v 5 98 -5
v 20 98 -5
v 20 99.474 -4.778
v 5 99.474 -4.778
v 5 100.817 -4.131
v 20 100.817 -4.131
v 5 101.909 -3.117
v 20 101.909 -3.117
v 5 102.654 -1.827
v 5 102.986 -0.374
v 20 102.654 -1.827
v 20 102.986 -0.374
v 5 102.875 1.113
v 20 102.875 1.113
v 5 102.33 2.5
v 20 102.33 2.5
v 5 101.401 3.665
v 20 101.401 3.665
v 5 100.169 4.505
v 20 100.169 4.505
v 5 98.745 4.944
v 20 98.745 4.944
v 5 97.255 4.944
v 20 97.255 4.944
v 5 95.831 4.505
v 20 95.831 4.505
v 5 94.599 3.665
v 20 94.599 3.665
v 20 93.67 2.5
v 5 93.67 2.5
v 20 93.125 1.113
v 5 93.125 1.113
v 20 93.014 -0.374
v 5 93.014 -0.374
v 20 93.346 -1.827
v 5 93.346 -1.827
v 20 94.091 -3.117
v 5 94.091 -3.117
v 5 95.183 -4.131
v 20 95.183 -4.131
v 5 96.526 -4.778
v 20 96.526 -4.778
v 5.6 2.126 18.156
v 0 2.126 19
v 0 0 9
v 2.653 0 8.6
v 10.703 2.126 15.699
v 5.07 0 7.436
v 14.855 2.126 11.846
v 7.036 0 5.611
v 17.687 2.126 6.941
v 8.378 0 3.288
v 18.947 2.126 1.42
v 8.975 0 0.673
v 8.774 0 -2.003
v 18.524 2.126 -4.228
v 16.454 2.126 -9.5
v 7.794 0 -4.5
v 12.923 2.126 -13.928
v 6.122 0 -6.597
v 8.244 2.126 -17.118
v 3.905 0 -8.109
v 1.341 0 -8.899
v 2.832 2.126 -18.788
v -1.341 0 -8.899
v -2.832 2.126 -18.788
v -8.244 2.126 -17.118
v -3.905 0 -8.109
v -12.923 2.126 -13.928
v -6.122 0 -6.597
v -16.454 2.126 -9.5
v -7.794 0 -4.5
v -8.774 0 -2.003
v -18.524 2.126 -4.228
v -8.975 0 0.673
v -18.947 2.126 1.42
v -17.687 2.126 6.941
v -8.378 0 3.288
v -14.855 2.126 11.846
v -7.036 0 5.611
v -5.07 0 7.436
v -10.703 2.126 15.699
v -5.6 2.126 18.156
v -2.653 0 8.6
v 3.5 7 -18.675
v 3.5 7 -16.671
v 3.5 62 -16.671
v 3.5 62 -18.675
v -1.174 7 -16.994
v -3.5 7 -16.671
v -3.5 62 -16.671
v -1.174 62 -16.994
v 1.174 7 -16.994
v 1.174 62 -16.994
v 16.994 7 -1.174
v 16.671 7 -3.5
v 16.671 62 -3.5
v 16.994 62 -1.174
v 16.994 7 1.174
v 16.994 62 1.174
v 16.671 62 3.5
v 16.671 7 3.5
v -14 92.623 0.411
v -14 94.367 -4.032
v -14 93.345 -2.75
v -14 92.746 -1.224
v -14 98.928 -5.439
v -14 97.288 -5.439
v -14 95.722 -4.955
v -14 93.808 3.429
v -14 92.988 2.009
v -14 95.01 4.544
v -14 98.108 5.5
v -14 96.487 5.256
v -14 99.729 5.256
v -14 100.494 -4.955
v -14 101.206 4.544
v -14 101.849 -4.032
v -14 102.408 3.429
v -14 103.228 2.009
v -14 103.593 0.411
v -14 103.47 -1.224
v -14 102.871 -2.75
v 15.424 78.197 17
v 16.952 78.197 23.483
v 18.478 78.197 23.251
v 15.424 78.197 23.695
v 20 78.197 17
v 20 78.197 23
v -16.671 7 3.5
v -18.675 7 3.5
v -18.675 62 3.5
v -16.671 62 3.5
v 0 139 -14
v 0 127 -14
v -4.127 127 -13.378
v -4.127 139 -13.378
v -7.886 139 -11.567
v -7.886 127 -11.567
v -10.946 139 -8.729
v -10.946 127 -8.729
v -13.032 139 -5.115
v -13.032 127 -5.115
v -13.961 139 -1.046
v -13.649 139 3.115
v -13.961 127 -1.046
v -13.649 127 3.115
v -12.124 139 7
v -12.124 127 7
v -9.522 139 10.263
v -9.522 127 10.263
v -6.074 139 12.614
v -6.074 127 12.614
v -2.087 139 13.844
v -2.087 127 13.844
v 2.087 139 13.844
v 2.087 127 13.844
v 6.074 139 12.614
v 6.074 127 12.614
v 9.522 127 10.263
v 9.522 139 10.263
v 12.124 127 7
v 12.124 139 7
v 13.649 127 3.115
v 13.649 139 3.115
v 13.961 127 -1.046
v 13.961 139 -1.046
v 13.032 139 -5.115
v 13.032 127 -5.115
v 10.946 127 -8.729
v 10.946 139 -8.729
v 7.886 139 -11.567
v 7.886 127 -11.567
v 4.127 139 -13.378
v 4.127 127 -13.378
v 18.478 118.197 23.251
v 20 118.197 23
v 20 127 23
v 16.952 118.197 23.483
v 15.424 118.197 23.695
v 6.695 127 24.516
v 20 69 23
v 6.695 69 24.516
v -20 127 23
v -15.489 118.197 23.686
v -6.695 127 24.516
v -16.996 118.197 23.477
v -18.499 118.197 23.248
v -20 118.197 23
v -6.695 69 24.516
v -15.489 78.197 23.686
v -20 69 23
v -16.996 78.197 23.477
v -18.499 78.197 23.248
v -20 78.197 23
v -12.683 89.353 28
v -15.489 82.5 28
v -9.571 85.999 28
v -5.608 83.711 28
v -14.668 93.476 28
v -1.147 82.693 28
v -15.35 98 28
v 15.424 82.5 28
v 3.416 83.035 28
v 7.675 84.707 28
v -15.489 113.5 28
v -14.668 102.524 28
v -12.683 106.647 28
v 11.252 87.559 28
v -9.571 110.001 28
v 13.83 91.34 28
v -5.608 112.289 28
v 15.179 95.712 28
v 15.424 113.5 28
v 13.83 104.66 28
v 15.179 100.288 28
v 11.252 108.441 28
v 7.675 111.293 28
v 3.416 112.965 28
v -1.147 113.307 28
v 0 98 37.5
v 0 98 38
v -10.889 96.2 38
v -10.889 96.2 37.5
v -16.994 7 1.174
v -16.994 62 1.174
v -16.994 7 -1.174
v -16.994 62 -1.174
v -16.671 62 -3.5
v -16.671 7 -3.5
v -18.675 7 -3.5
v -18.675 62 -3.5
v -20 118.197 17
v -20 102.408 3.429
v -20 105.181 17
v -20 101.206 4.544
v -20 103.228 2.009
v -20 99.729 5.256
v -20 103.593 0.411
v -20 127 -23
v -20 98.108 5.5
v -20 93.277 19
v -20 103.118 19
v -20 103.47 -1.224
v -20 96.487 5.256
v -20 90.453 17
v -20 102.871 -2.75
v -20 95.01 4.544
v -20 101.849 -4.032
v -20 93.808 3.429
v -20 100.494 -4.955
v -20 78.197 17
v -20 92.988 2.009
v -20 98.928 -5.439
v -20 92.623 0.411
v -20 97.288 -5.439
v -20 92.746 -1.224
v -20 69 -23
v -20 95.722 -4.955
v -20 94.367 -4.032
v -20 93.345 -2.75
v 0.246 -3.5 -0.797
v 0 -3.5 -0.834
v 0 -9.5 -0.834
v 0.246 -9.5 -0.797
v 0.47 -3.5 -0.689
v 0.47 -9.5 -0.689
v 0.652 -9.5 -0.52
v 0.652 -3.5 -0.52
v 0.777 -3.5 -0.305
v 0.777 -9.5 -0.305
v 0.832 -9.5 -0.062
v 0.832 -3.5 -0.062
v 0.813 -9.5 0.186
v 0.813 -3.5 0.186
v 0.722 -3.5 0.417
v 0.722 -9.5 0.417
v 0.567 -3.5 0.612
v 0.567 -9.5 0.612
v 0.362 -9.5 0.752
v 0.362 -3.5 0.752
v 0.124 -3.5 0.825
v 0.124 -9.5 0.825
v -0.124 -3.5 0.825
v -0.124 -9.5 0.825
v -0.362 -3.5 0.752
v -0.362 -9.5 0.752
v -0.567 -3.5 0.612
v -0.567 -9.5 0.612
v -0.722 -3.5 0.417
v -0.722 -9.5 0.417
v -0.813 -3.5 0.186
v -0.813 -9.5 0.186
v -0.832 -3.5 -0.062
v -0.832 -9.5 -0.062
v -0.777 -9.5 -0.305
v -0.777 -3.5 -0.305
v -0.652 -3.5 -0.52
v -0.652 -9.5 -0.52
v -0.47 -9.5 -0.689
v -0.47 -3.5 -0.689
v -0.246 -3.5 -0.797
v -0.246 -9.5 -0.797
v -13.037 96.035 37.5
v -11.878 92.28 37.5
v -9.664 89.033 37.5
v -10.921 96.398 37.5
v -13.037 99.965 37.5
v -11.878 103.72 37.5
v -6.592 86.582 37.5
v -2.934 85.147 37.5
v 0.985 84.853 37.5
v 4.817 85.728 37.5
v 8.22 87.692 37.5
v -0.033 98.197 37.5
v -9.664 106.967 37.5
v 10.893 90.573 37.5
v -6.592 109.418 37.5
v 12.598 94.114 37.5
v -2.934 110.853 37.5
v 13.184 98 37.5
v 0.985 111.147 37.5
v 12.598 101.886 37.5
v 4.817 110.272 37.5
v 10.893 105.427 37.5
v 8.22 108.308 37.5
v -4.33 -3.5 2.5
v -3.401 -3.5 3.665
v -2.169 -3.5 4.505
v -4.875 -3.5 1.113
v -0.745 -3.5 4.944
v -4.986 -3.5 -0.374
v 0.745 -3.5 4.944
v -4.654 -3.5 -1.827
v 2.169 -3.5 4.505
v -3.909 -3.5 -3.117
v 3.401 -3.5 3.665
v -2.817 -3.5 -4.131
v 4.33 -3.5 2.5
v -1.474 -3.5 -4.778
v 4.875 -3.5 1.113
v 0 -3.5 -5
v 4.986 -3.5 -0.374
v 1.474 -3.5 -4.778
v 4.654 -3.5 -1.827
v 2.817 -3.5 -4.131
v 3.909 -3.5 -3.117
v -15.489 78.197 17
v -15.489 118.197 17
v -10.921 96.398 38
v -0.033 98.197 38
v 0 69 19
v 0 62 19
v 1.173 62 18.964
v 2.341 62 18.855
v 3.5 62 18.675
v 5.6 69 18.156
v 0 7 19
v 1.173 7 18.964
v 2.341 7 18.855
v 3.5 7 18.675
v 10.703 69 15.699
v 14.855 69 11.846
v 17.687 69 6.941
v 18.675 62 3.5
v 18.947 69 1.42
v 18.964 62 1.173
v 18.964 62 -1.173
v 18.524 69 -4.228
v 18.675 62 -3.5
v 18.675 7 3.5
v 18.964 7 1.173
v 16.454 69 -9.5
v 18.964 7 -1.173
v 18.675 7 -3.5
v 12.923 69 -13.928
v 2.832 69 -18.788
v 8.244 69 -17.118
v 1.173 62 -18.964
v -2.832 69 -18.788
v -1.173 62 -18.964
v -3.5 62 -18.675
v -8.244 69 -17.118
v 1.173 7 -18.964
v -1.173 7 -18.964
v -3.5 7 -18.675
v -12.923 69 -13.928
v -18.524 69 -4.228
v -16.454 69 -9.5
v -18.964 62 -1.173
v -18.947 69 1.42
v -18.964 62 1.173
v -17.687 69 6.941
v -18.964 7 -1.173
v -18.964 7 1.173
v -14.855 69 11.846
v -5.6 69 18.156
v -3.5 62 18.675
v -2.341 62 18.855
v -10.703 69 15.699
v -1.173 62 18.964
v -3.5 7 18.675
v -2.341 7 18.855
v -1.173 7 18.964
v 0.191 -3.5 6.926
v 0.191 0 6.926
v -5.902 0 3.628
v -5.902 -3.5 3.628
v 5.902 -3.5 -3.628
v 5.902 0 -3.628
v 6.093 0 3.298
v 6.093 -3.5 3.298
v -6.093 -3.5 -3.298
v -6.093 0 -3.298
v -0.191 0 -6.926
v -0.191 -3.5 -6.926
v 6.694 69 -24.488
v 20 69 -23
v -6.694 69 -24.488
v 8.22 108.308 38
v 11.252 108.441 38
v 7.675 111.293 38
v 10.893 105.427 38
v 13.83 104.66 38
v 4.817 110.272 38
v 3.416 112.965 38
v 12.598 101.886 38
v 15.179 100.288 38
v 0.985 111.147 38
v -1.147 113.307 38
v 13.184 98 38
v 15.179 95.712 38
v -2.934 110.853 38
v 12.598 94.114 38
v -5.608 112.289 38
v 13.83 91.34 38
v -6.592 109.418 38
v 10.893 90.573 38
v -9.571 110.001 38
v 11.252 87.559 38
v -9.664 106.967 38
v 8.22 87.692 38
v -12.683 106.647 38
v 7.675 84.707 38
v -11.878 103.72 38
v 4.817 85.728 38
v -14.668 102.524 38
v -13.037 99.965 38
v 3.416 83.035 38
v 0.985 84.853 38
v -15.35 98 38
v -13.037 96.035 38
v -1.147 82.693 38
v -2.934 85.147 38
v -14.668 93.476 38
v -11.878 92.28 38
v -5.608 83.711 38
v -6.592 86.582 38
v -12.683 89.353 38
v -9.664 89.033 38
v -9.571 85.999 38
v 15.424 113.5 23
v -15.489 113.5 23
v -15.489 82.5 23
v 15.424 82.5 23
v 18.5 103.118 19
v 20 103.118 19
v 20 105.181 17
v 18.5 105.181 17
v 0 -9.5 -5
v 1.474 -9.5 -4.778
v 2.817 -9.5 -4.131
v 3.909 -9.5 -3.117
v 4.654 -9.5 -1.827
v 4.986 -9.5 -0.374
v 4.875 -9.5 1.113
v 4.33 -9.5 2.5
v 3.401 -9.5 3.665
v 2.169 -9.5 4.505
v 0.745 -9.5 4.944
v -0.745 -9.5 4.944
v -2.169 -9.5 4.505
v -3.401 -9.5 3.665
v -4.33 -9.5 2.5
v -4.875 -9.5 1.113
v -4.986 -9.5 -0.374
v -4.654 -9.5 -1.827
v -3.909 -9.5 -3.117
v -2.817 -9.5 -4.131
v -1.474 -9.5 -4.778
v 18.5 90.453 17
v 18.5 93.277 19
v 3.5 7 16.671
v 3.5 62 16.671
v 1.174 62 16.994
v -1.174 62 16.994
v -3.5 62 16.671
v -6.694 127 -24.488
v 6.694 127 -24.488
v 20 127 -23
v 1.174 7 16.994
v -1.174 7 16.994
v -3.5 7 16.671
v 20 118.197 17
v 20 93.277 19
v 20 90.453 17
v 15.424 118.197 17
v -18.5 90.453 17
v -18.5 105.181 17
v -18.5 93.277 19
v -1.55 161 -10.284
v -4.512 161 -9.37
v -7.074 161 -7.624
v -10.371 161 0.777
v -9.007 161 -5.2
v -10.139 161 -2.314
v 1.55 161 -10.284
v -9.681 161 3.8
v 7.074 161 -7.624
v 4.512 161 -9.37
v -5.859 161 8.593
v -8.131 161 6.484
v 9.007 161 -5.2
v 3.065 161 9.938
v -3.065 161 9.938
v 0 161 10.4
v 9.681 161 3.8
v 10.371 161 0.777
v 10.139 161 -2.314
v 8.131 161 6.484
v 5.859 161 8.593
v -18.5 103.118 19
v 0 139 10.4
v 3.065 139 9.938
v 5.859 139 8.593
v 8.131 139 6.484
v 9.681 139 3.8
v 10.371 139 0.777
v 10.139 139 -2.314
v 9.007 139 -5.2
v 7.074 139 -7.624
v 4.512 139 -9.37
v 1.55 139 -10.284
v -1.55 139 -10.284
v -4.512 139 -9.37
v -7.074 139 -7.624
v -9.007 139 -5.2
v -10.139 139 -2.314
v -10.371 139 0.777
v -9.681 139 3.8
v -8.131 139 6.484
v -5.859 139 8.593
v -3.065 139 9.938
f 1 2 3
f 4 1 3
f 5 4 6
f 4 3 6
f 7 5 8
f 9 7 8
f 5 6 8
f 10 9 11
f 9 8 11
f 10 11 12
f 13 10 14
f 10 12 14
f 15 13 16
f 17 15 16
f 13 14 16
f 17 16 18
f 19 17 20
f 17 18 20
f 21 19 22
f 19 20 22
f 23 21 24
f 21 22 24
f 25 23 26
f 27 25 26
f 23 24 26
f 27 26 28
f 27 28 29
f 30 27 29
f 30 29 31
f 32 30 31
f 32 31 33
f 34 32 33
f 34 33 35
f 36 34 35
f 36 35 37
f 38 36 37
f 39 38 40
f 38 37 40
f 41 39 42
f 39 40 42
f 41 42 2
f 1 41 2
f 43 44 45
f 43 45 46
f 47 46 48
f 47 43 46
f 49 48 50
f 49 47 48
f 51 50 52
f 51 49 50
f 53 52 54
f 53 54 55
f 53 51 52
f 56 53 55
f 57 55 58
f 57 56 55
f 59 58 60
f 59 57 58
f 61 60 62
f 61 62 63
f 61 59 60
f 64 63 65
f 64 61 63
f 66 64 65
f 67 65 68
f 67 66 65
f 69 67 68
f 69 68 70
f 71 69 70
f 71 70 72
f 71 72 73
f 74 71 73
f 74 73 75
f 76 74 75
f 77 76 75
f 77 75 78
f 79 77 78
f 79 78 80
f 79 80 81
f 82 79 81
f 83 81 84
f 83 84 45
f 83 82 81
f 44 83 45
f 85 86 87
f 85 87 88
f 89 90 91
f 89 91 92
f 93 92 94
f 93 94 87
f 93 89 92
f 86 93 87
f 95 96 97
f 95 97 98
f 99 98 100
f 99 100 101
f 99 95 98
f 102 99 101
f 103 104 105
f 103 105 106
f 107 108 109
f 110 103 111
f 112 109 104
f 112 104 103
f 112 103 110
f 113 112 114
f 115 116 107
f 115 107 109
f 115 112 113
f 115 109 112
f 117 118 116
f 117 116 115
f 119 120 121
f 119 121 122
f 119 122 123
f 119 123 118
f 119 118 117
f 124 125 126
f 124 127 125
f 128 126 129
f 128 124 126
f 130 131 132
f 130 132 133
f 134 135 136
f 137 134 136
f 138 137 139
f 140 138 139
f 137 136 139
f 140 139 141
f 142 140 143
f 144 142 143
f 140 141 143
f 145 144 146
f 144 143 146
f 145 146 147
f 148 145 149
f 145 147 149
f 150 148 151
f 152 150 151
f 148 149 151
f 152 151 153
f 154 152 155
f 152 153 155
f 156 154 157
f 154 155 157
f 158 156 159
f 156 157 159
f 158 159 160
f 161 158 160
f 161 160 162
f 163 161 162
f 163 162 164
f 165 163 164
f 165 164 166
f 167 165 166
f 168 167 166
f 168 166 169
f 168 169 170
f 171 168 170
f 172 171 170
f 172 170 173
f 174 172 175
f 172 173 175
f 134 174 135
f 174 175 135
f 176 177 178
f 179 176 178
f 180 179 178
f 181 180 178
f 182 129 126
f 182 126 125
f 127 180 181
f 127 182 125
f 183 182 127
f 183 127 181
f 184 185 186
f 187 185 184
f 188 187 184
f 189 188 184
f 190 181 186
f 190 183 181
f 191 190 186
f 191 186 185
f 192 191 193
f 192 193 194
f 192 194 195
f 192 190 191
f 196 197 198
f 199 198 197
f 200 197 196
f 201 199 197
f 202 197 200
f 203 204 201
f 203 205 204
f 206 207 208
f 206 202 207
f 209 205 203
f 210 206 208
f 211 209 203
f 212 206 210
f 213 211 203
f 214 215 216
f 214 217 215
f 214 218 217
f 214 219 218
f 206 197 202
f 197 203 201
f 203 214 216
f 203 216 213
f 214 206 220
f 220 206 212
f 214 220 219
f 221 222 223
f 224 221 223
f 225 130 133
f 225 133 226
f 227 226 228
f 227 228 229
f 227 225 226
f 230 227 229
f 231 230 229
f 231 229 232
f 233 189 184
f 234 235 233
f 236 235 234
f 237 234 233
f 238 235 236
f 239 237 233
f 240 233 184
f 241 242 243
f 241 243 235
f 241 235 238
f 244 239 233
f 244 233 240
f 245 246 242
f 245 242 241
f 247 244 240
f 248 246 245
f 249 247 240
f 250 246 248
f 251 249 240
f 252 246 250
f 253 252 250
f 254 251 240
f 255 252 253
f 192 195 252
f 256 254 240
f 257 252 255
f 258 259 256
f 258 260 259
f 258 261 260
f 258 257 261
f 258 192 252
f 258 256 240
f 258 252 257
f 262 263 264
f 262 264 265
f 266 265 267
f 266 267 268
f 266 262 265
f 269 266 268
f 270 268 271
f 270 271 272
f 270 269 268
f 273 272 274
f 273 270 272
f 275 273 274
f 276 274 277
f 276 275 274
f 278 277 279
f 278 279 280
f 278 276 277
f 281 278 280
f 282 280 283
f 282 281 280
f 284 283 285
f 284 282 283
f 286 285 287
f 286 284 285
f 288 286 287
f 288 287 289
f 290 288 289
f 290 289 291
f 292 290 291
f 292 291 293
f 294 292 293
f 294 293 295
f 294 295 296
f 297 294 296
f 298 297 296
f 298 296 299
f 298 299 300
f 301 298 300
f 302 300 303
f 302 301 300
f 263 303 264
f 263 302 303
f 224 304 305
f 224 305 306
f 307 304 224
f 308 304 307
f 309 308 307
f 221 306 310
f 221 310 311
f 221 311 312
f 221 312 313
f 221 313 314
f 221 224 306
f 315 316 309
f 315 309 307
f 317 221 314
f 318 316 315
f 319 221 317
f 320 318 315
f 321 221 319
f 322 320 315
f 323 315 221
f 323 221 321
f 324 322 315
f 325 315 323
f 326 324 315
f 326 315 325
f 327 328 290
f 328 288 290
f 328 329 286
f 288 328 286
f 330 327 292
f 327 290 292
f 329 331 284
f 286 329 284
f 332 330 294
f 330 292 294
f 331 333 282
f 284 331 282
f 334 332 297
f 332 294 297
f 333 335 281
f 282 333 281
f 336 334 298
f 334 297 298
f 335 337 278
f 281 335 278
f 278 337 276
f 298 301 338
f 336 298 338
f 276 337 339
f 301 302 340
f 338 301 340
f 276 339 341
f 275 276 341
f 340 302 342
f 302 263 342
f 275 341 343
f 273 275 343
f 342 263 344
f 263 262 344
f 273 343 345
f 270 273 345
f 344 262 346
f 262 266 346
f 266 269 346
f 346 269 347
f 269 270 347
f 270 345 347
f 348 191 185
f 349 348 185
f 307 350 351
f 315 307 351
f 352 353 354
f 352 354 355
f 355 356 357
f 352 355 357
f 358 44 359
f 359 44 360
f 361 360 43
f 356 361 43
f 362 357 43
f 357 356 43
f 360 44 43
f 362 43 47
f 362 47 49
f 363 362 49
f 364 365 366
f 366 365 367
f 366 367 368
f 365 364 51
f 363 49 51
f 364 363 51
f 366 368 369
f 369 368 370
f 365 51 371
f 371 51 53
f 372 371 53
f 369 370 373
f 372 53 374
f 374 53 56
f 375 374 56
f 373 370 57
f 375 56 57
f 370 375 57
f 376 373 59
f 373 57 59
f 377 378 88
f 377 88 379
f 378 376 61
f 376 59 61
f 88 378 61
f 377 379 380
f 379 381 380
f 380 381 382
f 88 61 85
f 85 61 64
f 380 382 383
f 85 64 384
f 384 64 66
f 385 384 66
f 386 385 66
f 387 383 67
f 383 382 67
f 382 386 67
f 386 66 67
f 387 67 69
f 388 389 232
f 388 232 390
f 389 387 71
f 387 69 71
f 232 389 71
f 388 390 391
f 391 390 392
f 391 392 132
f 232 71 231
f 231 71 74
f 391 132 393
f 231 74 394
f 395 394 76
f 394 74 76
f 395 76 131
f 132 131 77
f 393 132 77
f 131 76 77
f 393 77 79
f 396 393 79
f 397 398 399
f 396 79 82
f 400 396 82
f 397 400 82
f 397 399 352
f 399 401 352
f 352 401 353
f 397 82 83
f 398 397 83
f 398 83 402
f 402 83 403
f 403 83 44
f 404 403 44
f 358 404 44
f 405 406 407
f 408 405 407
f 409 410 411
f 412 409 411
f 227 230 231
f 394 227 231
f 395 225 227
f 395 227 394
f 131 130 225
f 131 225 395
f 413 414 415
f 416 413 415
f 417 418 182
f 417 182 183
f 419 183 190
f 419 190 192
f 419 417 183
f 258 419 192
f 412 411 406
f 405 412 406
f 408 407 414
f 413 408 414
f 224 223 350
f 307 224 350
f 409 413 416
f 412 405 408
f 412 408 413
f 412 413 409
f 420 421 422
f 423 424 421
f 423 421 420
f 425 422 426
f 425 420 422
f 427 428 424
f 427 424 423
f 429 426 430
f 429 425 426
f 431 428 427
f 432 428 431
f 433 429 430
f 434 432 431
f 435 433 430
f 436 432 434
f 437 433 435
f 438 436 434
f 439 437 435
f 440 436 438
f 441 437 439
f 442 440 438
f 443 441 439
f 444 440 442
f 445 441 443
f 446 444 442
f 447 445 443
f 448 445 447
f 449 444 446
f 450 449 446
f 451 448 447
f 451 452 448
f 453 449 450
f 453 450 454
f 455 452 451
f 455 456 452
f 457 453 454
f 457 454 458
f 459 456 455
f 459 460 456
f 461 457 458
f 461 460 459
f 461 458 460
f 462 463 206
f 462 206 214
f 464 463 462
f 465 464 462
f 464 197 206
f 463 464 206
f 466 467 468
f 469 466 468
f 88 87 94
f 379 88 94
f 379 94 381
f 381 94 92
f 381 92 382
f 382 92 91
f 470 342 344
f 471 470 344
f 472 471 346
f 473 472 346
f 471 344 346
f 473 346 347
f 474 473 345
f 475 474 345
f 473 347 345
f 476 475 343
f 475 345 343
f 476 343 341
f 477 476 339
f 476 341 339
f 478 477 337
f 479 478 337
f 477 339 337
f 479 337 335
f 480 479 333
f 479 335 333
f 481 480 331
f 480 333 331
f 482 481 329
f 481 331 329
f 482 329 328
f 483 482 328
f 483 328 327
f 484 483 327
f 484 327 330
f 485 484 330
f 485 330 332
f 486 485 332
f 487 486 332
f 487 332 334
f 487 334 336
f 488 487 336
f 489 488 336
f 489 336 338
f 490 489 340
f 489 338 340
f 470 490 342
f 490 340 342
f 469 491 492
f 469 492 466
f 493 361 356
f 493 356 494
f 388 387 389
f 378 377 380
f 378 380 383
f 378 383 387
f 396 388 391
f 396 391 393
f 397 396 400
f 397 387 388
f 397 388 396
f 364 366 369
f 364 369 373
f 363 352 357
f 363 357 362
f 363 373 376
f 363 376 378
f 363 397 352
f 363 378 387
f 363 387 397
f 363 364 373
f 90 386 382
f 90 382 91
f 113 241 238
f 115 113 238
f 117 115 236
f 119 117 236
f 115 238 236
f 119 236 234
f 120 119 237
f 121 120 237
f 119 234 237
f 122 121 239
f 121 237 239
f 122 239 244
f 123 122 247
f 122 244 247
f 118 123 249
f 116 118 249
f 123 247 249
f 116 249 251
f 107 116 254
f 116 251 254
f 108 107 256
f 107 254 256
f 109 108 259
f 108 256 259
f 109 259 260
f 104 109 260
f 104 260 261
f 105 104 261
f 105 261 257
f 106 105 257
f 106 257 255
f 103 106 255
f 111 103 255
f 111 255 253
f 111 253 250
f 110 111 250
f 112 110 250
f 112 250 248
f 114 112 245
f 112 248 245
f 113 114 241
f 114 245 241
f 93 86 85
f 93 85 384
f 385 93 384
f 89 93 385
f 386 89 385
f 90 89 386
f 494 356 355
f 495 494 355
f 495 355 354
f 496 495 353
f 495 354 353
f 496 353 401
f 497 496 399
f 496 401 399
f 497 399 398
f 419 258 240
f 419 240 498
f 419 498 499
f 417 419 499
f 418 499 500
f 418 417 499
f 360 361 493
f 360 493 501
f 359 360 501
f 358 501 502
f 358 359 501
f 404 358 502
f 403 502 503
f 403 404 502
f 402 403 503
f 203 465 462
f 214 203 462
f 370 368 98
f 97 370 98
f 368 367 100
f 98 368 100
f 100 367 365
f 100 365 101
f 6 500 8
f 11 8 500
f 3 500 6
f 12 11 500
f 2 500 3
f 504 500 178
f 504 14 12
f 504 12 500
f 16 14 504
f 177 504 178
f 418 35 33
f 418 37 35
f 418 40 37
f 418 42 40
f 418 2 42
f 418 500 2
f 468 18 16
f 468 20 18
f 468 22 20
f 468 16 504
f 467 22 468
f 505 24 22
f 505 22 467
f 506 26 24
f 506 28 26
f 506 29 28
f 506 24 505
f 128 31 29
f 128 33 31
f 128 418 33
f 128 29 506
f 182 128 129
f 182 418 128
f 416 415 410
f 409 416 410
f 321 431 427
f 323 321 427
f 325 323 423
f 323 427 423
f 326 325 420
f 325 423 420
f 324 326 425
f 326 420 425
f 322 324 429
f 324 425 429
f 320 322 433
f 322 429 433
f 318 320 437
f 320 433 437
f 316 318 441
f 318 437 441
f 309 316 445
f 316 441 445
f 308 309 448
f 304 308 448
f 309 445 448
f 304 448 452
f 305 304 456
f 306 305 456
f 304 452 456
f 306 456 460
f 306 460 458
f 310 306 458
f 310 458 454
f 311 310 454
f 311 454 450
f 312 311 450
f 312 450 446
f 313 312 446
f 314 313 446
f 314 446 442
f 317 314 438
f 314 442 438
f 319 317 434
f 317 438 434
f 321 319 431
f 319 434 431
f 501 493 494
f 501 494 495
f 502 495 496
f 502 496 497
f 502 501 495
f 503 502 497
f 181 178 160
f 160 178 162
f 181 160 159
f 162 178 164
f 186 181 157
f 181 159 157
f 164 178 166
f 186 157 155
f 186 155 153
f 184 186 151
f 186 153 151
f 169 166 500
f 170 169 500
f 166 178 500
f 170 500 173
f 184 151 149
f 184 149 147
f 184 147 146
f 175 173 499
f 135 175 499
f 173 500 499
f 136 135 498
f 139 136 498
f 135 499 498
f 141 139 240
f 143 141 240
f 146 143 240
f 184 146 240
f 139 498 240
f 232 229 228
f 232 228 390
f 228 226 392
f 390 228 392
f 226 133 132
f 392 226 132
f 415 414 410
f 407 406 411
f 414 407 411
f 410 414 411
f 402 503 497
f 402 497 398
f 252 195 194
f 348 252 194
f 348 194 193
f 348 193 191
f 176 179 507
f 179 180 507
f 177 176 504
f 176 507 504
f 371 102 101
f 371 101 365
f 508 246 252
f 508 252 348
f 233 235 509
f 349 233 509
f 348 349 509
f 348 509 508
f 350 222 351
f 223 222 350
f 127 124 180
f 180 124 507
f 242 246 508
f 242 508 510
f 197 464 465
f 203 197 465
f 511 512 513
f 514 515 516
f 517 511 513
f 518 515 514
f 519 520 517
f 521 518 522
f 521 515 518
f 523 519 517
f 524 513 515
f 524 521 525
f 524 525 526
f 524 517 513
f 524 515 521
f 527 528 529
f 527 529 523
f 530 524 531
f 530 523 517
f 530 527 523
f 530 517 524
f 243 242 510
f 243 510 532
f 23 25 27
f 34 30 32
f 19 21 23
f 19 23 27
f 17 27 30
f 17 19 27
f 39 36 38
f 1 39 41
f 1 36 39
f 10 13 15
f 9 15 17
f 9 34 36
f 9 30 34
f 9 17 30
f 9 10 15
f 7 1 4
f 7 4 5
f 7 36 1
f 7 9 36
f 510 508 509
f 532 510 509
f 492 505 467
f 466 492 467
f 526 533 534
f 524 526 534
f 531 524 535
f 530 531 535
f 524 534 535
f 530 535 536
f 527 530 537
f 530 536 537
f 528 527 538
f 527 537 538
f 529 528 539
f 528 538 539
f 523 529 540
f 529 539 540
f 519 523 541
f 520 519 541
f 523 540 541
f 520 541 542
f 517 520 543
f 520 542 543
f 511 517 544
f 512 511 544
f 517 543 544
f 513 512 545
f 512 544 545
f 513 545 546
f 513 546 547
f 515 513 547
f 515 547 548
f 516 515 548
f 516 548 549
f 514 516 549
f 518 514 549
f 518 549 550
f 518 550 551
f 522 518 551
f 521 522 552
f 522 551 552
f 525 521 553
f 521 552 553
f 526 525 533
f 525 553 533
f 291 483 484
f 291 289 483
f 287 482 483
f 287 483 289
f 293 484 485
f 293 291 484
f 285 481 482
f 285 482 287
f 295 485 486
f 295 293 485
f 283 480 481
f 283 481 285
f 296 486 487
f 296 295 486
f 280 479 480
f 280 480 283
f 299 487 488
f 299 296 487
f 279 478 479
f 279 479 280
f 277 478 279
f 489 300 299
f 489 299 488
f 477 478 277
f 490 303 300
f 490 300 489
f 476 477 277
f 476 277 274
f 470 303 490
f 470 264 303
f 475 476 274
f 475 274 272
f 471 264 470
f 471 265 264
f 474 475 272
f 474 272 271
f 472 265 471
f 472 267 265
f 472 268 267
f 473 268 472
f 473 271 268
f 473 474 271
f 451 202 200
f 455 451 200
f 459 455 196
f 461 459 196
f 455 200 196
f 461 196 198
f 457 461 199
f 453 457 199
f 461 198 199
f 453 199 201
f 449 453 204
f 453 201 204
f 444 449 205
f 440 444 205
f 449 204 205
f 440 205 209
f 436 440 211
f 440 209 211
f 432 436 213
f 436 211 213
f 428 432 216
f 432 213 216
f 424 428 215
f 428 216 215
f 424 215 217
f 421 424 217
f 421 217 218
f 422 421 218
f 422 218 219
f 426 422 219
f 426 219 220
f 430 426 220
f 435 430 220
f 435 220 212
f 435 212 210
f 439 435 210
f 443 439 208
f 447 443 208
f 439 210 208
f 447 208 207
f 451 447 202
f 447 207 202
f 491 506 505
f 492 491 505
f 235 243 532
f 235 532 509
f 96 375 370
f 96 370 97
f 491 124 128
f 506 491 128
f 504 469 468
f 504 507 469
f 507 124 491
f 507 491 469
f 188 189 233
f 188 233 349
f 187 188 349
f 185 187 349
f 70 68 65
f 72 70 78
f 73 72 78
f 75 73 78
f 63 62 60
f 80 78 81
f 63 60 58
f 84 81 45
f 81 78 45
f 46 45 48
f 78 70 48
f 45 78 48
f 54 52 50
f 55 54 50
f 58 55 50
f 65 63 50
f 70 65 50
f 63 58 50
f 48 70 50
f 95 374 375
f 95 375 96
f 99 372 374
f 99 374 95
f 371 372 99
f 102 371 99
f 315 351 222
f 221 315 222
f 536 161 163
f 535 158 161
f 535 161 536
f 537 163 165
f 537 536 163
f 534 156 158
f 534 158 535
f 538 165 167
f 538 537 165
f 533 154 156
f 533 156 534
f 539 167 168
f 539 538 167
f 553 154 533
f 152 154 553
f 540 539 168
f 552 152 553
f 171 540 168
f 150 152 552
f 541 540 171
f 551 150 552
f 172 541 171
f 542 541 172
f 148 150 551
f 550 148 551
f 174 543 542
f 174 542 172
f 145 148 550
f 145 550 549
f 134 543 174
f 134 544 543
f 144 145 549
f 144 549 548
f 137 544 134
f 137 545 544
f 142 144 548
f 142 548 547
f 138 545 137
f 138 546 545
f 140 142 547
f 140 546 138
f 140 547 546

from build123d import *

# Parameters (mm, degrees)
SKETCH_1_R           = 19
EXTRUDE_1_DEPTH      = 69
CHAMFER_1_SIZE       = 10
CHAMFER_1_SIZE2      = 2.125565617
EXTRUDE_2_DEPTH      = 3.5
SKETCH_3_R           = 5
SKETCH_3_R_2         = 0.834244999
EXTRUDE_3_DEPTH      = 6
EXTRUDE_4_DEPTH      = 58
SKETCH_5_W           = 31
SKETCH_5_H           = 31
EXTRUDE_5_DEPTH      = 5
SKETCH_6_R           = 15.35
EXTRUDE_6_DEPTH      = 10
SKETCH_7_R           = 13.183834188
CUT_EXTRUDE_7_DEPTH  = 0.5
SKETCH_9_R           = 14
EXTRUDE_8_DEPTH      = 12
SKETCH_10_R          = 10.4
EXTRUDE_9_DEPTH      = 22
CUT_EXTRUDE_START    = 55
CUT_EXTRUDE_11_DEPTH = 55
SKETCH_12_W          = 4.576157751
SKETCH_12_H          = 40
SKETCH_12_W_2        = 4.510929988
CUT_EXTRUDE_12_DEPTH = 6
EXTRUDE_13_DEPTH     = 1.5
SKETCH_15_R          = 5.5
CUT_EXTRUDE_14_DEPTH = 6
SKETCH_16_R          = 5
CUT_EXTRUDE_15_DEPTH = 15


with BuildPart() as part:
    # 草图1 → 拉伸1 (new body)
    with BuildSketch(Plane(origin=(0, 0, 0), x_dir=(1, 0, 0), z_dir=(0, 1, 0))):
        with Locations(Location((0, 0, 0), (0, 0, 270))):
            Circle(SKETCH_1_R)
    extrude(amount=EXTRUDE_1_DEPTH)

    # 倒角1
    chamfer_1_edges = [part.edges().sort_by_distance(p)[0] for p in [
        (0, 0, -19),
    ]]
    chamfer_1_side = [part.faces().sort_by_distance(p)[0] for p in [
        (0, 0, 0),
    ]]
    chamfer(chamfer_1_edges, length=CHAMFER_1_SIZE, length2=CHAMFER_1_SIZE2, reference=chamfer_1_side[0])

    # 草图11 → 拉伸11 (cut)
    with BuildSketch(Plane.XZ.offset(-62).offset(CUT_EXTRUDE_START)):
        with BuildLine():
            Line((16.671271122, 3.5), (18.674849397, 3.5))
            ThreePointArc((18.674849397, 3.5), (19, 0), (18.674849397, -3.5))
            Line((18.674849397, -3.5), (16.671271122, -3.5))
            ThreePointArc((16.671271122, -3.5), (17.034708123, 0), (16.671271122, 3.5))
        make_face()
        with BuildLine():
            Line((-3.5, 16.671271122), (-3.5, 18.674849397))
            ThreePointArc((-3.5, 18.674849397), (0, 19), (3.5, 18.674849397))
            Line((3.5, 18.674849397), (3.5, 16.671271122))
            ThreePointArc((3.5, 16.671271122), (0, 17.034708123), (-3.5, 16.671271122))
        make_face()
        with BuildLine():
            Line((3.5, -16.671271122), (3.5, -18.674849397))
            ThreePointArc((3.5, -18.674849397), (0, -19), (-3.5, -18.674849397))
            Line((-3.5, -18.674849397), (-3.5, -16.671271122))
            ThreePointArc((-3.5, -16.671271122), (0, -17.034708123), (3.5, -16.671271122))
        make_face()
        with BuildLine():
            Line((-16.671271122, -3.5), (-18.674849397, -3.5))
            ThreePointArc((-18.674849397, -3.5), (-19, 0), (-18.674849397, 3.5))
            Line((-18.674849397, 3.5), (-16.671271122, 3.5))
            ThreePointArc((-16.671271122, 3.5), (-17.034708123, 0), (-16.671271122, -3.5))
        make_face()
    extrude(amount=-CUT_EXTRUDE_11_DEPTH, mode=Mode.SUBTRACT)


with BuildPart() as body_2:
    # 草图2 → 拉伸2 (new body)
    with BuildSketch(Plane.XZ):
        Polygon((5.902320346, -3.628031772), (6.093127853, 3.297543474), (0.190807508, 6.925575247), (-5.902320346, 3.628031772), (-6.093127853, -3.297543474), (-0.190807508, -6.925575247), align=None)
    extrude(amount=EXTRUDE_2_DEPTH)


with BuildPart() as body_3:
    # 草图3 → 拉伸3 (new body)
    with BuildSketch(Plane.XZ.offset(3.5)):
        with Locations(Location((0, 0, 0), (0, 0, 270))):
            Circle(SKETCH_3_R)
        with Locations(Location((0, 0, 0), (0, 0, 270))):
            Circle(SKETCH_3_R_2, mode=Mode.SUBTRACT)
    extrude(amount=EXTRUDE_3_DEPTH)


with BuildPart() as body_4:
    # 草图4 → 拉伸4 (new body)
    with BuildSketch(Plane(origin=(0, 69, 0), x_dir=(1, 0, 0), z_dir=(0, 1, 0))):
        with BuildLine():
            Line((-20, -23), (-20, 23))
            ThreePointArc((-20, 23), (0, 24.673983482), (20, 23))
            Line((20, 23), (20, -23))
            ThreePointArc((20, -23), (0, -24.706329443), (-20, -23))
        make_face()
    extrude(amount=EXTRUDE_4_DEPTH)

    # 草图9 → 拉伸8 (add)
    with BuildSketch(Plane(origin=(0, 127, 0), x_dir=(1, 0, 0), z_dir=(0, 1, 0))):
        with Locations(Location((0, 0, 0), (0, 0, 90))):
            Circle(SKETCH_9_R)
    extrude(amount=EXTRUDE_8_DEPTH)

    # 草图10 → 拉伸9 (add)
    with BuildSketch(Plane(origin=(0, 139, 0), x_dir=(1, 0, 0), z_dir=(0, 1, 0))):
        with Locations(Location((0, 0, 0), (0, 0, 270))):
            Circle(SKETCH_10_R)
    extrude(amount=EXTRUDE_9_DEPTH)


with BuildPart() as body_5:
    # 草图5 → 拉伸5 (new body)
    with BuildSketch(Plane.XY.offset(23)):
        with Locations((0, 98)):
            Rectangle(SKETCH_5_W, SKETCH_5_H)
    extrude(amount=EXTRUDE_5_DEPTH)

    # 草图6 → 拉伸6 (add)
    with BuildSketch(Plane.XY.offset(28)):
        with Locations(Location((0, 98, 0), (0, 0, 180))):
            Circle(SKETCH_6_R)
    extrude(amount=EXTRUDE_6_DEPTH)

    # 草图7 → 拉伸7 (cut)
    with BuildSketch(Plane.XY.offset(38)):
        with Locations((0, 98)):
            Circle(SKETCH_7_R)
        Polygon((0, 98), (-10.888731231, 96.200291232), (-10.921345112, 96.397614152), (-0.032613881, 98.19732292), align=None, mode=Mode.SUBTRACT)
    extrude(amount=-CUT_EXTRUDE_7_DEPTH, mode=Mode.SUBTRACT)


with BuildPart() as cut_extrude_12_tool:
    # 草图12 → 拉伸12 (new, symmetric)
    with BuildSketch(Plane.XY.offset(23)):
        with Locations((17.711921125, 98.19732292)):
            Rectangle(SKETCH_12_W, SKETCH_12_H)
        with Locations((-17.744535006, 98.19732292)):
            Rectangle(SKETCH_12_W_2, SKETCH_12_H)
    extrude(amount=CUT_EXTRUDE_12_DEPTH, both=True)


with BuildPart() as body_4_1:
    add(body_4.part)

    # 拉伸12: cut by cut_extrude_12_tool
    add(cut_extrude_12_tool.part, mode=Mode.SUBTRACT)

    # 草图14 → 拉伸13 (add)
    with BuildSketch(Plane.ZY.offset(20)):
        Polygon((17, 105.180615559), (17, 90.453235832), (19, 93.276872504), (19, 103.117773336), align=None)
    extrude_13 = extrude(amount=-EXTRUDE_13_DEPTH)

    # 镜向1: 拉伸13 across plane
    add(extrude_13.mirror(Plane(origin=(0, 0, 0), x_dir=(0, 0, 1), z_dir=(1, 0, 0))))

    # 草图15 → 拉伸14 (cut)
    with BuildSketch(Plane.ZY.offset(20)):
        with Locations((0, 98.108057789)):
            Circle(SKETCH_15_R)
    extrude(amount=-CUT_EXTRUDE_14_DEPTH, mode=Mode.SUBTRACT)

    # 草图16 → 拉伸15 (cut)
    with BuildSketch(Plane(origin=(20, 0, 0), x_dir=(0, 0, -1), z_dir=(1, 0, 0))):
        with Locations((0, 98)):
            Circle(SKETCH_16_R)
    extrude(amount=-CUT_EXTRUDE_15_DEPTH, mode=Mode.SUBTRACT)


with BuildPart() as body_5_1:
    add(body_5.part)

    # 拉伸12: cut by cut_extrude_12_tool
    add(cut_extrude_12_tool.part, mode=Mode.SUBTRACT)


solid = Compound([part.part, body_2.part, body_3.part, body_4_1.part, body_5_1.part])
